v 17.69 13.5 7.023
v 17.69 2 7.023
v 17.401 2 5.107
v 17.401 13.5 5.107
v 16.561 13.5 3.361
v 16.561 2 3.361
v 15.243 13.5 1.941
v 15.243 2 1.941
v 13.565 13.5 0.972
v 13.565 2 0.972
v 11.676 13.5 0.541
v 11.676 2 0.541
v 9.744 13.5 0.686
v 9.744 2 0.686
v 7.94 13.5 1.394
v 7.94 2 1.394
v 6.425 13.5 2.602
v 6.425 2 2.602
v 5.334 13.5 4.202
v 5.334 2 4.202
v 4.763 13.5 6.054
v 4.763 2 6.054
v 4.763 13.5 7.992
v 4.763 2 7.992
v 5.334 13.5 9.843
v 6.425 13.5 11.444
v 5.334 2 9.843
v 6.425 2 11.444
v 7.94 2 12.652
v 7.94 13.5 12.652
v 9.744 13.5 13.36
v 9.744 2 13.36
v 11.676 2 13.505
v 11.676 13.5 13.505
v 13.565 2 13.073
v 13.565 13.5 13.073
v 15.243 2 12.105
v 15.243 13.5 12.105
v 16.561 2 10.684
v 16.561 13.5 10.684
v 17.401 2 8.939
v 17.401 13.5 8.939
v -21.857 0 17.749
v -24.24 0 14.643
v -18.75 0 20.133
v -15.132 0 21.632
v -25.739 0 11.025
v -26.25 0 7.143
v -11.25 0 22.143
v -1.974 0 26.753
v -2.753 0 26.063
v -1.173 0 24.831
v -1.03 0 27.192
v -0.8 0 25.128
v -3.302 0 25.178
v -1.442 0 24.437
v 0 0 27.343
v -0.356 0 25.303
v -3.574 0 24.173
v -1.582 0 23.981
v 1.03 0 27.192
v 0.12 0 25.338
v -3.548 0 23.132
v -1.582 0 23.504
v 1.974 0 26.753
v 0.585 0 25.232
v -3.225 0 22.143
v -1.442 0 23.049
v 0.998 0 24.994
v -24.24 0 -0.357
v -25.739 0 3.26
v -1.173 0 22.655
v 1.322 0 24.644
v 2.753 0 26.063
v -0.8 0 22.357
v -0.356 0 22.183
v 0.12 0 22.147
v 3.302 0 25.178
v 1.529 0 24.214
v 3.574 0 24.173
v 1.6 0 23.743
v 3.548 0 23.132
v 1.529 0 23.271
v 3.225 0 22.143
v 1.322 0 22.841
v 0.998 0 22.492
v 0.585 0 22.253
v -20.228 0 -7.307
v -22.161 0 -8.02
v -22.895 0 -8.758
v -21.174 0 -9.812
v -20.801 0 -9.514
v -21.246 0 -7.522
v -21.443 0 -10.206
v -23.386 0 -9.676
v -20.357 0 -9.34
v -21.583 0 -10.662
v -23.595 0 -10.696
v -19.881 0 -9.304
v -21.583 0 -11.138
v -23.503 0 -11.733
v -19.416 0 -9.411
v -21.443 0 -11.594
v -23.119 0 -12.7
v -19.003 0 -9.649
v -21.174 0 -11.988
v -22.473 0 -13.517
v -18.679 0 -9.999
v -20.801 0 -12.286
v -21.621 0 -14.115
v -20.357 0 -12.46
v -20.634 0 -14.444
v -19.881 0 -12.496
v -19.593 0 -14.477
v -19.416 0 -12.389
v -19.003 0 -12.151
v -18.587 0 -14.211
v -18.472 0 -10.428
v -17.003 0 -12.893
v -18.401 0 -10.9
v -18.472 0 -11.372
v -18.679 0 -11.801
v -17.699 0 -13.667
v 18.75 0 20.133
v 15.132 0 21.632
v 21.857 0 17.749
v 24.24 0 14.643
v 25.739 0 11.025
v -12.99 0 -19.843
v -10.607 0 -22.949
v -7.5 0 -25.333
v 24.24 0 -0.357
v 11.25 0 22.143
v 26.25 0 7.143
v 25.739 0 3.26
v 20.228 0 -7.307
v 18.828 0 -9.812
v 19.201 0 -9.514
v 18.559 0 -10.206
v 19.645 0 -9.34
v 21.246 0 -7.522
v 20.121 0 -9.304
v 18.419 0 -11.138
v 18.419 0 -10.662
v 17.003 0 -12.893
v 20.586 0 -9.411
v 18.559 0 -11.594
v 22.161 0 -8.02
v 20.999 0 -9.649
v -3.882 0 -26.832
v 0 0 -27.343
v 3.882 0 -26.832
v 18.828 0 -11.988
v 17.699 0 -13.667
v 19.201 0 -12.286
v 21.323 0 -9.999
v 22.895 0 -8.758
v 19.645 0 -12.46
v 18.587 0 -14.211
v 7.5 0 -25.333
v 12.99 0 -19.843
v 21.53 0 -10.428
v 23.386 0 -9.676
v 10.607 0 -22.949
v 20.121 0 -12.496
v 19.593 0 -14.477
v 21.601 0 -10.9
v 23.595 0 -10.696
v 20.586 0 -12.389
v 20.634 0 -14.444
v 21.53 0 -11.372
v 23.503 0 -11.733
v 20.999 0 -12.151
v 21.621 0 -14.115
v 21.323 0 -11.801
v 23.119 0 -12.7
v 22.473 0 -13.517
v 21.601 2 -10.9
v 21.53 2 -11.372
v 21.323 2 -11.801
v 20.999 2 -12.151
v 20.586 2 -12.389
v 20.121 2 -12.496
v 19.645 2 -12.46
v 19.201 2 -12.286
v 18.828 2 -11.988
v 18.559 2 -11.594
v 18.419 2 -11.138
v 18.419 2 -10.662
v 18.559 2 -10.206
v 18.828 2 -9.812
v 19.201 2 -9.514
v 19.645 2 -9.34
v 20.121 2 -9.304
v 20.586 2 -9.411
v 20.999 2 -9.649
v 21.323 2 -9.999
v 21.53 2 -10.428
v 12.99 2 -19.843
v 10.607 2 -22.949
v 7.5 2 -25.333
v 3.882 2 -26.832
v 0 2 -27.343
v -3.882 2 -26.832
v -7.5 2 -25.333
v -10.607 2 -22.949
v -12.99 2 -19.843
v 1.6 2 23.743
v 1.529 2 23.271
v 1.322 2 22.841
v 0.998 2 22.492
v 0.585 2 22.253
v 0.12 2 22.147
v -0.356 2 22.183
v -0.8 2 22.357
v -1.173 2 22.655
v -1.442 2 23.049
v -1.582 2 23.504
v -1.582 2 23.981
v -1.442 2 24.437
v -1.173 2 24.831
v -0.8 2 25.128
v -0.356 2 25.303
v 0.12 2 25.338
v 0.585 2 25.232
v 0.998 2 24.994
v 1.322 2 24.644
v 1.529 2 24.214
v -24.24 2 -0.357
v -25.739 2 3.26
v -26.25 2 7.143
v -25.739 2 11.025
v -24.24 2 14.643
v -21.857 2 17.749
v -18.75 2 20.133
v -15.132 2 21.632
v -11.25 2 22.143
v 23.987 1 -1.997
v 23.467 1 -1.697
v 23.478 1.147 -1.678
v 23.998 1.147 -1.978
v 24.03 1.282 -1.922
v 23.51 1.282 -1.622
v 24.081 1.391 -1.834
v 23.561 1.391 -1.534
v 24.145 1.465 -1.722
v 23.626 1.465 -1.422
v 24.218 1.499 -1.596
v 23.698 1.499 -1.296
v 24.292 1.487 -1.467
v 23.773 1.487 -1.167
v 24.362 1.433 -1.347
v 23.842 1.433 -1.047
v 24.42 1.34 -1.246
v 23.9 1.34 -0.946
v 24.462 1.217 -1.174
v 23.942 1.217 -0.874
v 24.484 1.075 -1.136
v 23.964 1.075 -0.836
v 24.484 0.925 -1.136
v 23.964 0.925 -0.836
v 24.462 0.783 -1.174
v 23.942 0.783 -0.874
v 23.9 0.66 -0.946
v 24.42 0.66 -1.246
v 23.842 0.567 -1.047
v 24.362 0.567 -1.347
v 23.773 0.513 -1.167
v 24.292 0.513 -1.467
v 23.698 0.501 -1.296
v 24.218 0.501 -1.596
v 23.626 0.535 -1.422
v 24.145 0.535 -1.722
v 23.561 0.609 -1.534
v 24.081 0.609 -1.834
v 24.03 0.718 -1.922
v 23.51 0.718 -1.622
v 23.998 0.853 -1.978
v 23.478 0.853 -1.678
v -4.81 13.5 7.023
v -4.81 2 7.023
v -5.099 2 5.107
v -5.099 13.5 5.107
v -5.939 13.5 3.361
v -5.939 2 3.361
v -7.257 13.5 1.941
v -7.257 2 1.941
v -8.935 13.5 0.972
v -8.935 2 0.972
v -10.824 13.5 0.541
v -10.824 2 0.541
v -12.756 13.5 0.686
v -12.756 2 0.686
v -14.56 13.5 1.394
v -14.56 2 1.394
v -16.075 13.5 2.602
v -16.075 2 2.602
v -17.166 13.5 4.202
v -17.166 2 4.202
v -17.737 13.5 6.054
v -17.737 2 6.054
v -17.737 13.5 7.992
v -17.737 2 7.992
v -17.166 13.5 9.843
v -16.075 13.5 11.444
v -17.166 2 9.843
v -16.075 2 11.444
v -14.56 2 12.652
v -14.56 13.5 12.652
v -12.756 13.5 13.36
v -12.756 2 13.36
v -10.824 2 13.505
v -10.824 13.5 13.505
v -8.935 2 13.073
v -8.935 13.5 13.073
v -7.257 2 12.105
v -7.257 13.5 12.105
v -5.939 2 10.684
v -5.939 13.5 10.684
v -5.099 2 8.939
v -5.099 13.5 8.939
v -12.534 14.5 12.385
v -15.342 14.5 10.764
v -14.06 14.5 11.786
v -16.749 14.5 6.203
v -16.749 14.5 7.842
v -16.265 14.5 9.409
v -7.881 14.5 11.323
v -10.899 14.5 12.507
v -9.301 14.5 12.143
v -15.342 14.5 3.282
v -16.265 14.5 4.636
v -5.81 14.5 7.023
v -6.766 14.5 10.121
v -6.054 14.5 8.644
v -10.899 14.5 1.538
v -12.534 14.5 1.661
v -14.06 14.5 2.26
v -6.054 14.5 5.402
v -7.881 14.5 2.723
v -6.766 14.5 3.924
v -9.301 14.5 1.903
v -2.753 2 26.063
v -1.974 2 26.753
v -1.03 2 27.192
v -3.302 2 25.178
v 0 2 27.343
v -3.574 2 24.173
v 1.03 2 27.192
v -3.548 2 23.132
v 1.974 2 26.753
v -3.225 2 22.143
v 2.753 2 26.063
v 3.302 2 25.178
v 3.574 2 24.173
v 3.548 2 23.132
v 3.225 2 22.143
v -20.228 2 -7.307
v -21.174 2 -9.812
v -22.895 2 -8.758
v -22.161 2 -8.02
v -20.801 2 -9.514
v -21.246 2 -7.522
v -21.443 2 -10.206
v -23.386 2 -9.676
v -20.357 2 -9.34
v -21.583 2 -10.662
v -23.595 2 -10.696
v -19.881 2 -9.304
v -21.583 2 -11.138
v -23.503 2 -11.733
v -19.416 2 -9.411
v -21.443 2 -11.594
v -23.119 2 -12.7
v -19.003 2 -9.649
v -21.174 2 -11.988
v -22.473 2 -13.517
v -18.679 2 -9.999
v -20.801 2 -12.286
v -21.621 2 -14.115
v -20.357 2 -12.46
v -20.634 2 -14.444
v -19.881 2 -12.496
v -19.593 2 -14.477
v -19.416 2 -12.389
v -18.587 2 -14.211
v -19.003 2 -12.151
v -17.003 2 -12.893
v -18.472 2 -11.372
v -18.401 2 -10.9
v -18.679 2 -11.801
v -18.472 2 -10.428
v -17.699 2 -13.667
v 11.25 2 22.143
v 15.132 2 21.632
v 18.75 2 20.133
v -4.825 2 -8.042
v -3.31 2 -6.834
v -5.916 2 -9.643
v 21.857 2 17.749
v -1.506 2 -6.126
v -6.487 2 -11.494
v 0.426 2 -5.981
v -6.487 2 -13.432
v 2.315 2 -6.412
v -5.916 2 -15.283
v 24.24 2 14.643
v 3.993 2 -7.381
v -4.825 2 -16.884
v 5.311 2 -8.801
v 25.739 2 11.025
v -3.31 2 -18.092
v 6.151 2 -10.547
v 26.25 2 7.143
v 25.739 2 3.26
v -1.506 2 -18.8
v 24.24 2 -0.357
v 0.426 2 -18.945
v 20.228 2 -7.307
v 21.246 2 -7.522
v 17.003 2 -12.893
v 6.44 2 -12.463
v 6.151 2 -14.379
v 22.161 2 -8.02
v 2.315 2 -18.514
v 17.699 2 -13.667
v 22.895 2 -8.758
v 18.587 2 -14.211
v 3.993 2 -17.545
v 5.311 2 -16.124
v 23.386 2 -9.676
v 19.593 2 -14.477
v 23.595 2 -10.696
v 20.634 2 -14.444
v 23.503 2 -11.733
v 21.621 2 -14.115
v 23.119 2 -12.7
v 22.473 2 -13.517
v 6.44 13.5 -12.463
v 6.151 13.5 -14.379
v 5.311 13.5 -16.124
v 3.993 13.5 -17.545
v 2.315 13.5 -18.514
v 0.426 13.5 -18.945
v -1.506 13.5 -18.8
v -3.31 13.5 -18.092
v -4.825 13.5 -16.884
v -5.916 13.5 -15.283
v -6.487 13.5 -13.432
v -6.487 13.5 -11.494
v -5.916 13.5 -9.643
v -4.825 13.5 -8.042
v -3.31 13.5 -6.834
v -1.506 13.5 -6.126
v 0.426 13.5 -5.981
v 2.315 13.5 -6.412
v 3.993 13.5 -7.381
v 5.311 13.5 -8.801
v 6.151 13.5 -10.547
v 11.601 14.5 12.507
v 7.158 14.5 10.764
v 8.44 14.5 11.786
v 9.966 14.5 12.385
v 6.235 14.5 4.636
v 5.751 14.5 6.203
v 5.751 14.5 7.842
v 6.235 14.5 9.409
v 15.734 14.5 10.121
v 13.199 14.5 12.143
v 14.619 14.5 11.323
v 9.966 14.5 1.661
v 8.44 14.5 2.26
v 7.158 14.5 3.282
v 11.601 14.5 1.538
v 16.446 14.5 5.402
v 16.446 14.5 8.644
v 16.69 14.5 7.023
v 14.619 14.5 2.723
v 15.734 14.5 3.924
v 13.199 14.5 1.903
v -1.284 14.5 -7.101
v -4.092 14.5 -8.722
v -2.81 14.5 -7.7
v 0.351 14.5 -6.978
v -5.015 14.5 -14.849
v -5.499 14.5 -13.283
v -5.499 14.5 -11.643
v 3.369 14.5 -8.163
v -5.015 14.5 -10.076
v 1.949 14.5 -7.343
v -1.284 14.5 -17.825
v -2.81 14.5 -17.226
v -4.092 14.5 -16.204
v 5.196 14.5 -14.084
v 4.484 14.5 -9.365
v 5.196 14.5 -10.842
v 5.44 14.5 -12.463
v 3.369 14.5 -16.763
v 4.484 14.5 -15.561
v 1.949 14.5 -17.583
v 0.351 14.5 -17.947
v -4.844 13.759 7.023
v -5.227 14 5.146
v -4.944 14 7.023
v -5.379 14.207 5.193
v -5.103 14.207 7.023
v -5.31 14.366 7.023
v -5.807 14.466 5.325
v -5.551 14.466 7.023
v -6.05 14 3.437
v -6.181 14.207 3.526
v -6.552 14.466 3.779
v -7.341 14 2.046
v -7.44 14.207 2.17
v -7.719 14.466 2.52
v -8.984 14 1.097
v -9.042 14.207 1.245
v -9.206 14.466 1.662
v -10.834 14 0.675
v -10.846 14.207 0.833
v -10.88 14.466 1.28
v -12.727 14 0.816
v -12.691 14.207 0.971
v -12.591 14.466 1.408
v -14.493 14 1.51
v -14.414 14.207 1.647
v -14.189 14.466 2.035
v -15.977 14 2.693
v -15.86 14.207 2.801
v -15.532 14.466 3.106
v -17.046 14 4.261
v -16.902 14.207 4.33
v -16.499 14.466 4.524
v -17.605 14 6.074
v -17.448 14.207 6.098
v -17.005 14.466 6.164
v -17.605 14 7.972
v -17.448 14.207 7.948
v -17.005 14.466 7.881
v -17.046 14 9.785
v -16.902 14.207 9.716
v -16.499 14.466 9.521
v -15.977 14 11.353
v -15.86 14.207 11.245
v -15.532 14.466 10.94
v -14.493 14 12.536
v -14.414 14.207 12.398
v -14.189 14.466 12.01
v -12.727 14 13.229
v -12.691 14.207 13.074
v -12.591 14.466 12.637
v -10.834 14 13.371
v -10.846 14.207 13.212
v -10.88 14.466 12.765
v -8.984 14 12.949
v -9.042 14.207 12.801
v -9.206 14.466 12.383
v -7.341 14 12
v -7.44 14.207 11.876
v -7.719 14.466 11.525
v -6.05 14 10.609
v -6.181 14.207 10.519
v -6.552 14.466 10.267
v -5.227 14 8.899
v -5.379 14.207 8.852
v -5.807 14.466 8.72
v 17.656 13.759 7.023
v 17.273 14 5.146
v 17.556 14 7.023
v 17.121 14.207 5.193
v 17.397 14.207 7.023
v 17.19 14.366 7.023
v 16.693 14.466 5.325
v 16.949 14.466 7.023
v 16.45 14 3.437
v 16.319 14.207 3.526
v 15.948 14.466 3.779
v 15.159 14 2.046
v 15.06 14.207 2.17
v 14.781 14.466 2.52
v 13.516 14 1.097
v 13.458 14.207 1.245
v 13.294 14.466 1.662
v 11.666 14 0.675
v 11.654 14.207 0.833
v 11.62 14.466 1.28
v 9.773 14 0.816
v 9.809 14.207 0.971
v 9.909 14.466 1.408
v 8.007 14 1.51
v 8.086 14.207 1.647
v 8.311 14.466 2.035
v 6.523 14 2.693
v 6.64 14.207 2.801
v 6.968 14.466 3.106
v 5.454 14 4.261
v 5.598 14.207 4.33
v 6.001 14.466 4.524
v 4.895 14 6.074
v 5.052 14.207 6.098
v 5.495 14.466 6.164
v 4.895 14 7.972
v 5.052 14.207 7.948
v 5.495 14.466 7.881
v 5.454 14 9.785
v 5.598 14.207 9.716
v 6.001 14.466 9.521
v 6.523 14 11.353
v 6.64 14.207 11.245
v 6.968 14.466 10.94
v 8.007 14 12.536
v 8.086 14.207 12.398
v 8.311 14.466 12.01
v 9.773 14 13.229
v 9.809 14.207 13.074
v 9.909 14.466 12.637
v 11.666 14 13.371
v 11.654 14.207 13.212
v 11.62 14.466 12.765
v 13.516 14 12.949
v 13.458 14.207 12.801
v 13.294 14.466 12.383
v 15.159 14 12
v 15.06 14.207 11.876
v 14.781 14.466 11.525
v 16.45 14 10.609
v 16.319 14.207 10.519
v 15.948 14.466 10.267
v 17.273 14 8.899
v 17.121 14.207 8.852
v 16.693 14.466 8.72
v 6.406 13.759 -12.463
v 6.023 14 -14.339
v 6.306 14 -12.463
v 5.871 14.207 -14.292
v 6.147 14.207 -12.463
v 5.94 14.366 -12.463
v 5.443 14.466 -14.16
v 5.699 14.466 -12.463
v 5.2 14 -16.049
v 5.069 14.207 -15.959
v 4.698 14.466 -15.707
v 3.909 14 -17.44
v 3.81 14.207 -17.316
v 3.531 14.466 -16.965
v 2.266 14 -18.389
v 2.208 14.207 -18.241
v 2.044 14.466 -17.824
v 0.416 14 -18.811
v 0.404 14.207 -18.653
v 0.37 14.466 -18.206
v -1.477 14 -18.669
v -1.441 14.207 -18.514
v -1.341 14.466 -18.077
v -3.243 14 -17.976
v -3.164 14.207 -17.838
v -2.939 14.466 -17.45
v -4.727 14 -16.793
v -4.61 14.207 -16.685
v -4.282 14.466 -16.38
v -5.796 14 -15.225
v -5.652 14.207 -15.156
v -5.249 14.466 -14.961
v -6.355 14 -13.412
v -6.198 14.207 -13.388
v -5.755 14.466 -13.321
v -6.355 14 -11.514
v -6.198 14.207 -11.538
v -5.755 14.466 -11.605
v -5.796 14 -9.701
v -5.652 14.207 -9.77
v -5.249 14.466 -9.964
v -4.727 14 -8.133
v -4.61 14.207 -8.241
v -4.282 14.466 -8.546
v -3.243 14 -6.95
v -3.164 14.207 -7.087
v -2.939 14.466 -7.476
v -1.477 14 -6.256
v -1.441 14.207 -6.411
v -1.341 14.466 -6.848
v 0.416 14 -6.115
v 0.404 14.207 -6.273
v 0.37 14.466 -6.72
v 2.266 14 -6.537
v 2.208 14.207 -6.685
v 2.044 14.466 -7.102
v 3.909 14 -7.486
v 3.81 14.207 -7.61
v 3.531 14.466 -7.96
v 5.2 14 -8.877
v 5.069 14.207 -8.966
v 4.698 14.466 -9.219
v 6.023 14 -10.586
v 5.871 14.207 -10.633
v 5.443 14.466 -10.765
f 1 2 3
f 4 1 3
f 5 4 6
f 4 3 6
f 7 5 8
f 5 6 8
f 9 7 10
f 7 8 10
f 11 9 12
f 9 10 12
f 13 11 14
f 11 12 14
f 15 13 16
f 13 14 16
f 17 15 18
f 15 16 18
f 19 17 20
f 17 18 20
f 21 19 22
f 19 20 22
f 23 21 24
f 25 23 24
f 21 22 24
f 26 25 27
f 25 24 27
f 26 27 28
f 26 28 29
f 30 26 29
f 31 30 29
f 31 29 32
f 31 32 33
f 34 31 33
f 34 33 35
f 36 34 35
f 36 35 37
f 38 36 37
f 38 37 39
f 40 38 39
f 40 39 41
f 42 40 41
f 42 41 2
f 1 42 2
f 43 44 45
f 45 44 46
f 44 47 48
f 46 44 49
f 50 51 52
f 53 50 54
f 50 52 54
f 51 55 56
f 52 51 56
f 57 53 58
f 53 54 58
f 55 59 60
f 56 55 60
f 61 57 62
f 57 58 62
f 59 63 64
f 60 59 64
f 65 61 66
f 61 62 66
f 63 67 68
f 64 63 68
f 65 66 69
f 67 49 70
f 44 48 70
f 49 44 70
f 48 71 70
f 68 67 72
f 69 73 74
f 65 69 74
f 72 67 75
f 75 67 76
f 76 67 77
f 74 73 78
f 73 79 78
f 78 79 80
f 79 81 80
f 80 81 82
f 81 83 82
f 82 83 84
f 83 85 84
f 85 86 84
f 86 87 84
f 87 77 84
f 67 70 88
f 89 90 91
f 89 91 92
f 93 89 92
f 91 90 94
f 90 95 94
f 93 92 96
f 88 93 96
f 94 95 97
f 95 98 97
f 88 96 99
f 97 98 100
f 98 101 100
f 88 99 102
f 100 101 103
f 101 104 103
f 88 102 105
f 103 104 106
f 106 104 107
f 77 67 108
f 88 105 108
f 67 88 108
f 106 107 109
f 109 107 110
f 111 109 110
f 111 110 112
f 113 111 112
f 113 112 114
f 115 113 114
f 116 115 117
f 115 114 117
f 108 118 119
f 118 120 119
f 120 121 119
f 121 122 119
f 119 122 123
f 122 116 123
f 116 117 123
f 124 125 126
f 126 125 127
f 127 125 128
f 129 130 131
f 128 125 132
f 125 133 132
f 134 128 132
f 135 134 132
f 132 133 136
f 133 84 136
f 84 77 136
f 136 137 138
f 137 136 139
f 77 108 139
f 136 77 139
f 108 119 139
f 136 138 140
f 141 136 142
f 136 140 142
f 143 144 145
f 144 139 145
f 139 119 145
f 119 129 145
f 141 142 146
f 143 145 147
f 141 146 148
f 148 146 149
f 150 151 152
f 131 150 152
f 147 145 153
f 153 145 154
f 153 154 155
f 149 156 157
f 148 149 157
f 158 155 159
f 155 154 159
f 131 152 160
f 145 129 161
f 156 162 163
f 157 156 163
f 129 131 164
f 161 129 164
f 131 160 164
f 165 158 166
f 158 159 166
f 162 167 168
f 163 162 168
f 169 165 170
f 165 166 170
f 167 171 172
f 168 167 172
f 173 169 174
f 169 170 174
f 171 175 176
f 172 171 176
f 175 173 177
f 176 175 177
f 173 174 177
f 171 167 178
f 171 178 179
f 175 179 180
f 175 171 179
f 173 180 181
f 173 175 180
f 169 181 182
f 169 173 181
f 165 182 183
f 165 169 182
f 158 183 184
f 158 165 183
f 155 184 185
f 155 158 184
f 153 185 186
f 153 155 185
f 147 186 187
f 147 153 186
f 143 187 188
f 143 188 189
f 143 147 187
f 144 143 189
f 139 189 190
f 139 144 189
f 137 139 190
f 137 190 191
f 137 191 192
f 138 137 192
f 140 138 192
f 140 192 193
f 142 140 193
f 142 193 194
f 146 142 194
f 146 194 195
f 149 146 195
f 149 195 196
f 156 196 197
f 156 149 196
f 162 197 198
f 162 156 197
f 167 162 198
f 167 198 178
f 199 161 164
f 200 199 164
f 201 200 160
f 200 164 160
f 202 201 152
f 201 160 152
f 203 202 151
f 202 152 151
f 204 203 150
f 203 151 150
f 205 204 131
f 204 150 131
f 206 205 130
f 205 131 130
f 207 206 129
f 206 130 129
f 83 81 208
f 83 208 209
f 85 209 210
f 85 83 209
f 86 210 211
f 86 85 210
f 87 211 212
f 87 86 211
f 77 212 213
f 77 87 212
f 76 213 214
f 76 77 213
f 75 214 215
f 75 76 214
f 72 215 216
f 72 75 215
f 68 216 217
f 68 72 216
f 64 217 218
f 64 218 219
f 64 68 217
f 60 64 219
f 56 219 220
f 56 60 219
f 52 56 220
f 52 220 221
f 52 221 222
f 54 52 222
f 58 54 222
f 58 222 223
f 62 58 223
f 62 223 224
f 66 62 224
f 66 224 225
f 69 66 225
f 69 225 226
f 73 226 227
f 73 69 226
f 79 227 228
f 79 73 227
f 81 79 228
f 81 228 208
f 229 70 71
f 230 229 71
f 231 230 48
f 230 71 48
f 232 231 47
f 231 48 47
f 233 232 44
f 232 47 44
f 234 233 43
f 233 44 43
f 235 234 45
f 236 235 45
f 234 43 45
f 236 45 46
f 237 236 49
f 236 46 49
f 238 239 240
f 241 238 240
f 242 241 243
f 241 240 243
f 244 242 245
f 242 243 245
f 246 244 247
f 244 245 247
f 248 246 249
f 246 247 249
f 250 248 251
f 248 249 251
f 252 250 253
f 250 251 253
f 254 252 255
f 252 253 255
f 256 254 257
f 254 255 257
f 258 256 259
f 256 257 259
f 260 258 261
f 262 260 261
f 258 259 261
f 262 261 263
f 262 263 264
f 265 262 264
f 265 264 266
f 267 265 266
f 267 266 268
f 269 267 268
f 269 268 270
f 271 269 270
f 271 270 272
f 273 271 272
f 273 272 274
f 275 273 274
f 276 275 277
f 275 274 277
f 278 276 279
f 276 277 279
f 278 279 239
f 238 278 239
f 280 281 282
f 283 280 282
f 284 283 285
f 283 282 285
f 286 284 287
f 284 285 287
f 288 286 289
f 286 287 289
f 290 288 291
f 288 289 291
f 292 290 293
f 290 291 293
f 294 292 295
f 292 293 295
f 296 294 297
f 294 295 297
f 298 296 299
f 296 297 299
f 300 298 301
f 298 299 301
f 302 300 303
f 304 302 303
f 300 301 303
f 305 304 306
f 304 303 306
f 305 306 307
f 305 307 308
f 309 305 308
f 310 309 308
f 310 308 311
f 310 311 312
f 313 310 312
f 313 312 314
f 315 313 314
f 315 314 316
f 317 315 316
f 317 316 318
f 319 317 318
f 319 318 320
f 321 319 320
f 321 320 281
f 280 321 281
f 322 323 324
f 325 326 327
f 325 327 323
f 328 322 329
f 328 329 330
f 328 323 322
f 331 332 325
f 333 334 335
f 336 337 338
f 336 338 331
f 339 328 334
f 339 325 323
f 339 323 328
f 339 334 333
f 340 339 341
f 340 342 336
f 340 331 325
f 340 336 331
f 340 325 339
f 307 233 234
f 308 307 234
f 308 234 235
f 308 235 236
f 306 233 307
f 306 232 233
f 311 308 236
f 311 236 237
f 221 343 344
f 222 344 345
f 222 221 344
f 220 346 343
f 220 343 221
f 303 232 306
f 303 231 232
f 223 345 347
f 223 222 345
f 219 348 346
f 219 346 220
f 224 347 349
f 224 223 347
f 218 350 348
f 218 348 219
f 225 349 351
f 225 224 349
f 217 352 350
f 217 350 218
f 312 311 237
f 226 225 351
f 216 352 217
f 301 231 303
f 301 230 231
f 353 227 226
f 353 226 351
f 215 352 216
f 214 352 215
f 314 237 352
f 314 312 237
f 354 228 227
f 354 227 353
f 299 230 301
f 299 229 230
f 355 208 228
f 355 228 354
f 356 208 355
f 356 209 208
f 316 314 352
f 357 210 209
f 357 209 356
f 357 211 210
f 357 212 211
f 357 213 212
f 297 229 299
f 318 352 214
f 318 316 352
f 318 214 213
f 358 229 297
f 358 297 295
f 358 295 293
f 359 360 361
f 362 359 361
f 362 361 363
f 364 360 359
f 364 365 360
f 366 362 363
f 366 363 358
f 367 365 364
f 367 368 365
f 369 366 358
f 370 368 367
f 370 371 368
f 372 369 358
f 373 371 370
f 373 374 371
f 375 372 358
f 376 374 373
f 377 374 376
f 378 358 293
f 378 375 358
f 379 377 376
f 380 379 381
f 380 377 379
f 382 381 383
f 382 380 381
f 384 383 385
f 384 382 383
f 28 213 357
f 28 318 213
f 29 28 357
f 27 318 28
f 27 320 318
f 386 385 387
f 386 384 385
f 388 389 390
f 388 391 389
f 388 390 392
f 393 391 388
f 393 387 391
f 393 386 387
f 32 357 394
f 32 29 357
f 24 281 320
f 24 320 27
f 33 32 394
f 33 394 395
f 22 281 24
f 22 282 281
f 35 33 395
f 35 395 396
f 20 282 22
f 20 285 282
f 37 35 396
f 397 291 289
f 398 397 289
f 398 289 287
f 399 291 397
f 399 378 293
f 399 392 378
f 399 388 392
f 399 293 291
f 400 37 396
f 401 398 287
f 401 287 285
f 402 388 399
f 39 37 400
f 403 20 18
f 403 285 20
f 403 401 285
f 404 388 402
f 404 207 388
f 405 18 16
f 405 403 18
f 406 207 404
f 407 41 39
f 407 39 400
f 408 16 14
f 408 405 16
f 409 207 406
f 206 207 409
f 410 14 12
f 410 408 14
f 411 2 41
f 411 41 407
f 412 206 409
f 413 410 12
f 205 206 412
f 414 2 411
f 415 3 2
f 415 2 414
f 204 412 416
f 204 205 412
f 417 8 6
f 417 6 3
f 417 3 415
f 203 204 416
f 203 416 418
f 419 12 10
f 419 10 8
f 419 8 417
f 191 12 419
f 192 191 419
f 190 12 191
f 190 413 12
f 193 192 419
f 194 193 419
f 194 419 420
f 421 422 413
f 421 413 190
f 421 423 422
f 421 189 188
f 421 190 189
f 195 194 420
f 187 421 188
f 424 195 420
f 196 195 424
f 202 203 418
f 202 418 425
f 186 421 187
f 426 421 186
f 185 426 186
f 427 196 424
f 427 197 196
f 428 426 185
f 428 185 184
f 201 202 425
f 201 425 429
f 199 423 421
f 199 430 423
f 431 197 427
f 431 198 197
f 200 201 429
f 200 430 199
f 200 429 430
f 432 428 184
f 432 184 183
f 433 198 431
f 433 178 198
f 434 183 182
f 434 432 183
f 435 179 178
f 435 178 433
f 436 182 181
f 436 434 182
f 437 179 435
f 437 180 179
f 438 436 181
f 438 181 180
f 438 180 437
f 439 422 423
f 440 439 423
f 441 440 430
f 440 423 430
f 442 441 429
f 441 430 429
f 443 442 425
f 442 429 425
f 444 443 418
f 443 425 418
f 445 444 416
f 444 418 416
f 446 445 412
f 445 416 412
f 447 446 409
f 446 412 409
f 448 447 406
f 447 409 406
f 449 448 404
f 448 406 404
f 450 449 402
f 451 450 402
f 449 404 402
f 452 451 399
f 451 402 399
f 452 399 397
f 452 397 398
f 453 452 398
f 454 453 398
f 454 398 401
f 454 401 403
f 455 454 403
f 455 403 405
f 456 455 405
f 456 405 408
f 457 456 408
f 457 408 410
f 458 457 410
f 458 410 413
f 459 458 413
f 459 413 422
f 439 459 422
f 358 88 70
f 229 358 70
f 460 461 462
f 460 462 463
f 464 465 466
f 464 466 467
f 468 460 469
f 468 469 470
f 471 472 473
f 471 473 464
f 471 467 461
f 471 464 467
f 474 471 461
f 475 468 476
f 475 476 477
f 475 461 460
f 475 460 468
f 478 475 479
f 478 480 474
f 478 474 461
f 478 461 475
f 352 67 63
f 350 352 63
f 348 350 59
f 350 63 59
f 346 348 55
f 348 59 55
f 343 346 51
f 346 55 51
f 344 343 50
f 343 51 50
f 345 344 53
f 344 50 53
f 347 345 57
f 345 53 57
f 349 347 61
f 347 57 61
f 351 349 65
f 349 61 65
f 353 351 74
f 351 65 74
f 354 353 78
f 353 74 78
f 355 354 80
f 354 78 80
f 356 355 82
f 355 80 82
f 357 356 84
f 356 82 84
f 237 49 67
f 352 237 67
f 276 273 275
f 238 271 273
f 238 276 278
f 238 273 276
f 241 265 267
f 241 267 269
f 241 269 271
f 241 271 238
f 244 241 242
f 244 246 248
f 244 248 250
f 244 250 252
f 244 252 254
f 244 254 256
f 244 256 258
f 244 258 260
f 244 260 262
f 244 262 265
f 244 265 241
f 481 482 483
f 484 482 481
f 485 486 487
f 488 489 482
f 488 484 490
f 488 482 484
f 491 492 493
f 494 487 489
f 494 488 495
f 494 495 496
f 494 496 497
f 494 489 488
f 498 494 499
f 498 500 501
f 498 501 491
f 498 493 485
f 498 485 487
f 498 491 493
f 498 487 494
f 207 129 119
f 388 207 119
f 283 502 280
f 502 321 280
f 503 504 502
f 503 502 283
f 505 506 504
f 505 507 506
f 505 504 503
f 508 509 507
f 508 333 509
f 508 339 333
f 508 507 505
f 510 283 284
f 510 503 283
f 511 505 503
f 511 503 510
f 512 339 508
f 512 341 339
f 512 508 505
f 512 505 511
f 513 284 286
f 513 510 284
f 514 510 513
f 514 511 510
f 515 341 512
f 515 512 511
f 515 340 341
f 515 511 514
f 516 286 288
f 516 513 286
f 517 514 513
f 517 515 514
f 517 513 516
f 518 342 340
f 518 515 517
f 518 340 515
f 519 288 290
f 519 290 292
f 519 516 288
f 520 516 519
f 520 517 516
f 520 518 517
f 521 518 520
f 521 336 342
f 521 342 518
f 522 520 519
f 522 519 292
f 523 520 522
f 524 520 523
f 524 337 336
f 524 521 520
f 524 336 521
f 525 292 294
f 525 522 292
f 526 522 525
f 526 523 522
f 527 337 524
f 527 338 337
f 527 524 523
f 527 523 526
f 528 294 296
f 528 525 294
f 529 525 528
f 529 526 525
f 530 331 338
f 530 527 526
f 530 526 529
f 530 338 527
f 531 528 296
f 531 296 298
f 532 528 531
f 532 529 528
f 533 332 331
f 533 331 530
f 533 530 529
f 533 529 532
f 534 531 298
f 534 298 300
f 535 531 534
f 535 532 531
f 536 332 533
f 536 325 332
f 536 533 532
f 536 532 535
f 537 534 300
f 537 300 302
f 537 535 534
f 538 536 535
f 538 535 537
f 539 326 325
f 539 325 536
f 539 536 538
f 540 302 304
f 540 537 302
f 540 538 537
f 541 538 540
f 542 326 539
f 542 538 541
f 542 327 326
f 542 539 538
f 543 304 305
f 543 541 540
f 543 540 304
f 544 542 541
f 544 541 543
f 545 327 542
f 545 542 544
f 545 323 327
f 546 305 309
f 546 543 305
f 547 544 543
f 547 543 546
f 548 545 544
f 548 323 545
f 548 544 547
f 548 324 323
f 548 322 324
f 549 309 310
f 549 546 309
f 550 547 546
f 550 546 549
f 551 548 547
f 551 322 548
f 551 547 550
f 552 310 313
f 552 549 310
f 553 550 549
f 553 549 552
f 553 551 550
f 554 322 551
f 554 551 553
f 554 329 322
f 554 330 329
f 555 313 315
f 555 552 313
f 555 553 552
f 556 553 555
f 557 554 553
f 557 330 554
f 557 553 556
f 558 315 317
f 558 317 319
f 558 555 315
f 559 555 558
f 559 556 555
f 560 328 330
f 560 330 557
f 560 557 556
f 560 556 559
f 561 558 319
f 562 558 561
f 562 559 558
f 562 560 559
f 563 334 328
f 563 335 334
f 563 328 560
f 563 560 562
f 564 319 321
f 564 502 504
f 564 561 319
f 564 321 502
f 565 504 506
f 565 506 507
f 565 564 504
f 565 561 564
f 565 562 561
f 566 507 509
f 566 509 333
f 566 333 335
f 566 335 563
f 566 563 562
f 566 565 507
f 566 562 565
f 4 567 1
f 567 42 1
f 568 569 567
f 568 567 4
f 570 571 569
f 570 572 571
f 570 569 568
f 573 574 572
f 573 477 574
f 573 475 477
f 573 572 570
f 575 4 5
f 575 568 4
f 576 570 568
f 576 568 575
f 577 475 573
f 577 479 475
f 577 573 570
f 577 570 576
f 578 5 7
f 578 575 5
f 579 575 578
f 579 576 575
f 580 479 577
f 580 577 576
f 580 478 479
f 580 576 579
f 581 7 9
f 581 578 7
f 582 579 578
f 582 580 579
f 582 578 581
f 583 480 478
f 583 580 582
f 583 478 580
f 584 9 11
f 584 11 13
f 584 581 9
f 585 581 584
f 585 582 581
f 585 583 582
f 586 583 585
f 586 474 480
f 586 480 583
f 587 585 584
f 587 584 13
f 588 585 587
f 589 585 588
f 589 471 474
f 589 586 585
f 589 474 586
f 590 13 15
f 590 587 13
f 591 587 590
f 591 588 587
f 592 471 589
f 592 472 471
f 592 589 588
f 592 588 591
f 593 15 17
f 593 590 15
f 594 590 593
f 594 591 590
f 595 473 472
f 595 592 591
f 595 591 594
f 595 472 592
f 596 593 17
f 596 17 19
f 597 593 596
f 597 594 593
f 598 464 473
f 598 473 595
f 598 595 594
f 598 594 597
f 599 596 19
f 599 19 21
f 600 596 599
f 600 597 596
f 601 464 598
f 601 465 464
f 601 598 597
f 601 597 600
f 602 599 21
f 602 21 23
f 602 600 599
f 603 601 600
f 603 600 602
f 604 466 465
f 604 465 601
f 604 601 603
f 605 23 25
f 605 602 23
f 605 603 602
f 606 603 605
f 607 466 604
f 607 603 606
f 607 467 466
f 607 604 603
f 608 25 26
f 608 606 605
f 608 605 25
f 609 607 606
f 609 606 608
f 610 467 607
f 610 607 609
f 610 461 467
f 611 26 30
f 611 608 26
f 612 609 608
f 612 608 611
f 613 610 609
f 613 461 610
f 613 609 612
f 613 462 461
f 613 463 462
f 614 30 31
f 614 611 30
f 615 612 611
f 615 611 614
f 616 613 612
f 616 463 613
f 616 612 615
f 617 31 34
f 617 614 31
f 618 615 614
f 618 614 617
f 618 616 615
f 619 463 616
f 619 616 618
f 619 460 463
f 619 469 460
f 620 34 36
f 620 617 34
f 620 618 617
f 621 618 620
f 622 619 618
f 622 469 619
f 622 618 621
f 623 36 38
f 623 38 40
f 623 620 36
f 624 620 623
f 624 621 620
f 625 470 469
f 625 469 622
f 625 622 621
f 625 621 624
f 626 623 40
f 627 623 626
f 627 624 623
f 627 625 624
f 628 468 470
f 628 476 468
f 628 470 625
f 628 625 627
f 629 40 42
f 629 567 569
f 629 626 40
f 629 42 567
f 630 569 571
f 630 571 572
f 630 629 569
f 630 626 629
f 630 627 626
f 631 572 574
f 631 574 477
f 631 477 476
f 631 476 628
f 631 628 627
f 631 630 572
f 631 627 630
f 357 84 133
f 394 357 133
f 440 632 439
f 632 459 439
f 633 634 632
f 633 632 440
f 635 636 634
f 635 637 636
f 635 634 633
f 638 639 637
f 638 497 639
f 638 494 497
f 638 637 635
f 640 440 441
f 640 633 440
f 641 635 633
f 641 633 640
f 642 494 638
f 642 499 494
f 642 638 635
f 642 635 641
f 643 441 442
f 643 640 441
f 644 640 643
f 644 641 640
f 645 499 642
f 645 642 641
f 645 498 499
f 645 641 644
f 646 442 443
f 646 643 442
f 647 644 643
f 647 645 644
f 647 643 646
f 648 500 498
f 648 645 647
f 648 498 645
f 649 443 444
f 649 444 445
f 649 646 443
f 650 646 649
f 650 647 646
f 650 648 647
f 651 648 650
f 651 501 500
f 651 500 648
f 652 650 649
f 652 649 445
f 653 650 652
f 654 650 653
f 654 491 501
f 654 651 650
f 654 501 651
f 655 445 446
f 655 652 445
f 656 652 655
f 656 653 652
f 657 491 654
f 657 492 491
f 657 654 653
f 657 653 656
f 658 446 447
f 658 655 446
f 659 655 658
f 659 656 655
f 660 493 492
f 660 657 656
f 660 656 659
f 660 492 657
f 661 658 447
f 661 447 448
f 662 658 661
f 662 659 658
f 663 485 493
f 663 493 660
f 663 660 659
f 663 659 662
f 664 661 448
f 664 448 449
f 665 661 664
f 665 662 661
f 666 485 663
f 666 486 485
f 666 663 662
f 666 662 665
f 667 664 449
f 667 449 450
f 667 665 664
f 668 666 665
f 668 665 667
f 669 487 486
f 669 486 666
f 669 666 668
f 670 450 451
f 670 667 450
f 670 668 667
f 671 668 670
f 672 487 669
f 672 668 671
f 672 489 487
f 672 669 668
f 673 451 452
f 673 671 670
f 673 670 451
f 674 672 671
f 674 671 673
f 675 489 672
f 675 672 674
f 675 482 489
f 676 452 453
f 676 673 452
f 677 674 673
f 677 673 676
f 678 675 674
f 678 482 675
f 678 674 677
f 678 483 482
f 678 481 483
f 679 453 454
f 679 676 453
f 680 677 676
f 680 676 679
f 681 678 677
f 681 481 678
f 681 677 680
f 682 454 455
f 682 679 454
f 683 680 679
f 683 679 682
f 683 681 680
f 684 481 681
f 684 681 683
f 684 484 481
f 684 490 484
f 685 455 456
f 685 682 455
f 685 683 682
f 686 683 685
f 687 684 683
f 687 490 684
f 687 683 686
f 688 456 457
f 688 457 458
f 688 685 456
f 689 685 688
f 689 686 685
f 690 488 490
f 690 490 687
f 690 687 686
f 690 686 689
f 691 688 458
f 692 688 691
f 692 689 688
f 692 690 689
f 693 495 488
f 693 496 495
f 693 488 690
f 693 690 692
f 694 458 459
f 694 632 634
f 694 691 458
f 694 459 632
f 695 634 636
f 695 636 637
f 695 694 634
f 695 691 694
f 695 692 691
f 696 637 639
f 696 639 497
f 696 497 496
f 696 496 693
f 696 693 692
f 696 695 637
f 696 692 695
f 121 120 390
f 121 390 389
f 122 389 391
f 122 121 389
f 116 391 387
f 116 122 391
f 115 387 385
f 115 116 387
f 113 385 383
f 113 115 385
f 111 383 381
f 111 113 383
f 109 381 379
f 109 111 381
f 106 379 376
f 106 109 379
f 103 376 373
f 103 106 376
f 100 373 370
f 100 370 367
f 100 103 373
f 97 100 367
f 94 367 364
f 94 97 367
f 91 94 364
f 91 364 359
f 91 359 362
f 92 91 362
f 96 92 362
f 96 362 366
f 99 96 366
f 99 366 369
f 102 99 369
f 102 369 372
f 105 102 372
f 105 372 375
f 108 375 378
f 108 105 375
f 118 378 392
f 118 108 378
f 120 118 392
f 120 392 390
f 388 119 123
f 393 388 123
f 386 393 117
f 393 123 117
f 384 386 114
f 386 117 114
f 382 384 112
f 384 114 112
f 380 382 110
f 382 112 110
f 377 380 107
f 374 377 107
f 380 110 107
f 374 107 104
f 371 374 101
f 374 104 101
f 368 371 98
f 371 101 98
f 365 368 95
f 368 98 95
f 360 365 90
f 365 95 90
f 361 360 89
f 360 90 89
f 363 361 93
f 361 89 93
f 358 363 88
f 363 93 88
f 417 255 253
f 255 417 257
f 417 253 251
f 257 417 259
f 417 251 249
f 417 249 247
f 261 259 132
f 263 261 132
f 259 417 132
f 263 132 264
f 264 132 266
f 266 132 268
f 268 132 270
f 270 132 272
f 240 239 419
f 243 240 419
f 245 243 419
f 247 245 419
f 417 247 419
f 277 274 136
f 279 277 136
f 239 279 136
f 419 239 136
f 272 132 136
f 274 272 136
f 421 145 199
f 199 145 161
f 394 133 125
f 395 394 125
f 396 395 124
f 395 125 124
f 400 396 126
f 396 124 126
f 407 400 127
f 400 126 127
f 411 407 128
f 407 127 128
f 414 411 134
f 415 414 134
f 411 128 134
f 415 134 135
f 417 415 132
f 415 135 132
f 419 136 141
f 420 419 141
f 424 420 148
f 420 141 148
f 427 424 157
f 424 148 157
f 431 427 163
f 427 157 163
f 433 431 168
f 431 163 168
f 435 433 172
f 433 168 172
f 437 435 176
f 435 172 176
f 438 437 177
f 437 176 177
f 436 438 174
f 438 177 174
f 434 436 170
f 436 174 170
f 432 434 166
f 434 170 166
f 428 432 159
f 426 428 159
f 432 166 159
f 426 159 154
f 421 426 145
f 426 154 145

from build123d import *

# Parameters (mm, degrees)
SKETCH5_R           = 1.6
BOSS_EXTRUDE2_DEPTH = 2
SKETCH6_R           = 6.5
BOSS_EXTRUDE3_DEPTH = 14.5
FILLET1_R           = 1
SKETCH7_R           = 0.5
BOSS_EXTRUDE4_DEPTH = 0.6


with BuildPart() as part:
    # Sketch5 → Boss-Extrude2 (new body)
    with BuildSketch(Plane(origin=(0, 0, 0), x_dir=(1, 0, 0), z_dir=(0, 1, 0))):
        with BuildLine():
            Line((-11.250000051, -22.142785594), (-3.22490315, -22.142785594))
            ThreePointArc((-3.22490315, -22.142785594), (-5.1e-08, -27.342785594), (3.224903048, -22.142785594))
            Line((3.224903048, -22.142785594), (11.249999949, -22.142785594))
            ThreePointArc((11.249999949, -22.142785594), (24.240381006, -14.642785594), (24.240381006, 0.357214406))
            Line((24.240381006, 0.357214406), (20.227832555, 7.30715219))
            ThreePointArc((20.227832555, 7.30715219), (23.118713105, 12.700000199), (17.002929456, 12.892848208))
            Line((17.002929456, 12.892848208), (12.990381006, 19.842785992))
            ThreePointArc((12.990381006, 19.842785992), (-5.1e-08, 27.342785992), (-12.990381108, 19.842785992))
            Line((-12.990381108, 19.842785992), (-17.002929558, 12.892848208))
            ThreePointArc((-17.002929558, 12.892848208), (-23.118713208, 12.700000199), (-20.227832658, 7.30715219))
            Line((-20.227832658, 7.30715219), (-24.240381108, 0.357214406))
            ThreePointArc((-24.240381108, 0.357214406), (-24.240381108, -14.642785594), (-11.250000051, -22.142785594))
        make_face()
        with Locations((20.001021652, 10.900000199)):
            Circle(SKETCH5_R, mode=Mode.SUBTRACT)
        with Locations((-5.1e-08, -23.742785594)):
            Circle(SKETCH5_R, mode=Mode.SUBTRACT)
        with Locations((-20.001021754, 10.900000199)):
            Circle(SKETCH5_R, mode=Mode.SUBTRACT)
    extrude(amount=BOSS_EXTRUDE2_DEPTH)

    # Sketch6 → Boss-Extrude3 (add)
    with BuildSketch(Plane(origin=(0, 0, 0), x_dir=(1, 0, 0), z_dir=(0, 1, 0))):
        with Locations((-0.060025126, 12.462836141)):
            Circle(SKETCH6_R)
        with Locations((11.189974874, -7.022735444)):
            Circle(SKETCH6_R)
        with Locations((-11.310025126, -7.022735444)):
            Circle(SKETCH6_R)
    extrude(amount=BOSS_EXTRUDE3_DEPTH)

    # Fillet1
    fillet1_edges = [part.edges().sort_by_distance(p)[0] for p in [
        (-6.560025126, 14.5, -12.462836141),
        (4.689974874, 14.5, 7.022735444),
        (-17.810025126, 14.5, 7.022735444),
    ]]
    fillet(fillet1_edges, radius=FILLET1_R)

    # Sketch7 → Boss-Extrude4 (add)
    with BuildSketch(Plane(origin=(18.334964129, 0, -10.585696476), x_dir=(-0.5, 0, -0.866025404), z_dir=(0.866025404, 0, -0.5))):
        with Locations((-10.763992659, 1)):
            Circle(SKETCH7_R)
    extrude(amount=BOSS_EXTRUDE4_DEPTH)


solid = part.part
